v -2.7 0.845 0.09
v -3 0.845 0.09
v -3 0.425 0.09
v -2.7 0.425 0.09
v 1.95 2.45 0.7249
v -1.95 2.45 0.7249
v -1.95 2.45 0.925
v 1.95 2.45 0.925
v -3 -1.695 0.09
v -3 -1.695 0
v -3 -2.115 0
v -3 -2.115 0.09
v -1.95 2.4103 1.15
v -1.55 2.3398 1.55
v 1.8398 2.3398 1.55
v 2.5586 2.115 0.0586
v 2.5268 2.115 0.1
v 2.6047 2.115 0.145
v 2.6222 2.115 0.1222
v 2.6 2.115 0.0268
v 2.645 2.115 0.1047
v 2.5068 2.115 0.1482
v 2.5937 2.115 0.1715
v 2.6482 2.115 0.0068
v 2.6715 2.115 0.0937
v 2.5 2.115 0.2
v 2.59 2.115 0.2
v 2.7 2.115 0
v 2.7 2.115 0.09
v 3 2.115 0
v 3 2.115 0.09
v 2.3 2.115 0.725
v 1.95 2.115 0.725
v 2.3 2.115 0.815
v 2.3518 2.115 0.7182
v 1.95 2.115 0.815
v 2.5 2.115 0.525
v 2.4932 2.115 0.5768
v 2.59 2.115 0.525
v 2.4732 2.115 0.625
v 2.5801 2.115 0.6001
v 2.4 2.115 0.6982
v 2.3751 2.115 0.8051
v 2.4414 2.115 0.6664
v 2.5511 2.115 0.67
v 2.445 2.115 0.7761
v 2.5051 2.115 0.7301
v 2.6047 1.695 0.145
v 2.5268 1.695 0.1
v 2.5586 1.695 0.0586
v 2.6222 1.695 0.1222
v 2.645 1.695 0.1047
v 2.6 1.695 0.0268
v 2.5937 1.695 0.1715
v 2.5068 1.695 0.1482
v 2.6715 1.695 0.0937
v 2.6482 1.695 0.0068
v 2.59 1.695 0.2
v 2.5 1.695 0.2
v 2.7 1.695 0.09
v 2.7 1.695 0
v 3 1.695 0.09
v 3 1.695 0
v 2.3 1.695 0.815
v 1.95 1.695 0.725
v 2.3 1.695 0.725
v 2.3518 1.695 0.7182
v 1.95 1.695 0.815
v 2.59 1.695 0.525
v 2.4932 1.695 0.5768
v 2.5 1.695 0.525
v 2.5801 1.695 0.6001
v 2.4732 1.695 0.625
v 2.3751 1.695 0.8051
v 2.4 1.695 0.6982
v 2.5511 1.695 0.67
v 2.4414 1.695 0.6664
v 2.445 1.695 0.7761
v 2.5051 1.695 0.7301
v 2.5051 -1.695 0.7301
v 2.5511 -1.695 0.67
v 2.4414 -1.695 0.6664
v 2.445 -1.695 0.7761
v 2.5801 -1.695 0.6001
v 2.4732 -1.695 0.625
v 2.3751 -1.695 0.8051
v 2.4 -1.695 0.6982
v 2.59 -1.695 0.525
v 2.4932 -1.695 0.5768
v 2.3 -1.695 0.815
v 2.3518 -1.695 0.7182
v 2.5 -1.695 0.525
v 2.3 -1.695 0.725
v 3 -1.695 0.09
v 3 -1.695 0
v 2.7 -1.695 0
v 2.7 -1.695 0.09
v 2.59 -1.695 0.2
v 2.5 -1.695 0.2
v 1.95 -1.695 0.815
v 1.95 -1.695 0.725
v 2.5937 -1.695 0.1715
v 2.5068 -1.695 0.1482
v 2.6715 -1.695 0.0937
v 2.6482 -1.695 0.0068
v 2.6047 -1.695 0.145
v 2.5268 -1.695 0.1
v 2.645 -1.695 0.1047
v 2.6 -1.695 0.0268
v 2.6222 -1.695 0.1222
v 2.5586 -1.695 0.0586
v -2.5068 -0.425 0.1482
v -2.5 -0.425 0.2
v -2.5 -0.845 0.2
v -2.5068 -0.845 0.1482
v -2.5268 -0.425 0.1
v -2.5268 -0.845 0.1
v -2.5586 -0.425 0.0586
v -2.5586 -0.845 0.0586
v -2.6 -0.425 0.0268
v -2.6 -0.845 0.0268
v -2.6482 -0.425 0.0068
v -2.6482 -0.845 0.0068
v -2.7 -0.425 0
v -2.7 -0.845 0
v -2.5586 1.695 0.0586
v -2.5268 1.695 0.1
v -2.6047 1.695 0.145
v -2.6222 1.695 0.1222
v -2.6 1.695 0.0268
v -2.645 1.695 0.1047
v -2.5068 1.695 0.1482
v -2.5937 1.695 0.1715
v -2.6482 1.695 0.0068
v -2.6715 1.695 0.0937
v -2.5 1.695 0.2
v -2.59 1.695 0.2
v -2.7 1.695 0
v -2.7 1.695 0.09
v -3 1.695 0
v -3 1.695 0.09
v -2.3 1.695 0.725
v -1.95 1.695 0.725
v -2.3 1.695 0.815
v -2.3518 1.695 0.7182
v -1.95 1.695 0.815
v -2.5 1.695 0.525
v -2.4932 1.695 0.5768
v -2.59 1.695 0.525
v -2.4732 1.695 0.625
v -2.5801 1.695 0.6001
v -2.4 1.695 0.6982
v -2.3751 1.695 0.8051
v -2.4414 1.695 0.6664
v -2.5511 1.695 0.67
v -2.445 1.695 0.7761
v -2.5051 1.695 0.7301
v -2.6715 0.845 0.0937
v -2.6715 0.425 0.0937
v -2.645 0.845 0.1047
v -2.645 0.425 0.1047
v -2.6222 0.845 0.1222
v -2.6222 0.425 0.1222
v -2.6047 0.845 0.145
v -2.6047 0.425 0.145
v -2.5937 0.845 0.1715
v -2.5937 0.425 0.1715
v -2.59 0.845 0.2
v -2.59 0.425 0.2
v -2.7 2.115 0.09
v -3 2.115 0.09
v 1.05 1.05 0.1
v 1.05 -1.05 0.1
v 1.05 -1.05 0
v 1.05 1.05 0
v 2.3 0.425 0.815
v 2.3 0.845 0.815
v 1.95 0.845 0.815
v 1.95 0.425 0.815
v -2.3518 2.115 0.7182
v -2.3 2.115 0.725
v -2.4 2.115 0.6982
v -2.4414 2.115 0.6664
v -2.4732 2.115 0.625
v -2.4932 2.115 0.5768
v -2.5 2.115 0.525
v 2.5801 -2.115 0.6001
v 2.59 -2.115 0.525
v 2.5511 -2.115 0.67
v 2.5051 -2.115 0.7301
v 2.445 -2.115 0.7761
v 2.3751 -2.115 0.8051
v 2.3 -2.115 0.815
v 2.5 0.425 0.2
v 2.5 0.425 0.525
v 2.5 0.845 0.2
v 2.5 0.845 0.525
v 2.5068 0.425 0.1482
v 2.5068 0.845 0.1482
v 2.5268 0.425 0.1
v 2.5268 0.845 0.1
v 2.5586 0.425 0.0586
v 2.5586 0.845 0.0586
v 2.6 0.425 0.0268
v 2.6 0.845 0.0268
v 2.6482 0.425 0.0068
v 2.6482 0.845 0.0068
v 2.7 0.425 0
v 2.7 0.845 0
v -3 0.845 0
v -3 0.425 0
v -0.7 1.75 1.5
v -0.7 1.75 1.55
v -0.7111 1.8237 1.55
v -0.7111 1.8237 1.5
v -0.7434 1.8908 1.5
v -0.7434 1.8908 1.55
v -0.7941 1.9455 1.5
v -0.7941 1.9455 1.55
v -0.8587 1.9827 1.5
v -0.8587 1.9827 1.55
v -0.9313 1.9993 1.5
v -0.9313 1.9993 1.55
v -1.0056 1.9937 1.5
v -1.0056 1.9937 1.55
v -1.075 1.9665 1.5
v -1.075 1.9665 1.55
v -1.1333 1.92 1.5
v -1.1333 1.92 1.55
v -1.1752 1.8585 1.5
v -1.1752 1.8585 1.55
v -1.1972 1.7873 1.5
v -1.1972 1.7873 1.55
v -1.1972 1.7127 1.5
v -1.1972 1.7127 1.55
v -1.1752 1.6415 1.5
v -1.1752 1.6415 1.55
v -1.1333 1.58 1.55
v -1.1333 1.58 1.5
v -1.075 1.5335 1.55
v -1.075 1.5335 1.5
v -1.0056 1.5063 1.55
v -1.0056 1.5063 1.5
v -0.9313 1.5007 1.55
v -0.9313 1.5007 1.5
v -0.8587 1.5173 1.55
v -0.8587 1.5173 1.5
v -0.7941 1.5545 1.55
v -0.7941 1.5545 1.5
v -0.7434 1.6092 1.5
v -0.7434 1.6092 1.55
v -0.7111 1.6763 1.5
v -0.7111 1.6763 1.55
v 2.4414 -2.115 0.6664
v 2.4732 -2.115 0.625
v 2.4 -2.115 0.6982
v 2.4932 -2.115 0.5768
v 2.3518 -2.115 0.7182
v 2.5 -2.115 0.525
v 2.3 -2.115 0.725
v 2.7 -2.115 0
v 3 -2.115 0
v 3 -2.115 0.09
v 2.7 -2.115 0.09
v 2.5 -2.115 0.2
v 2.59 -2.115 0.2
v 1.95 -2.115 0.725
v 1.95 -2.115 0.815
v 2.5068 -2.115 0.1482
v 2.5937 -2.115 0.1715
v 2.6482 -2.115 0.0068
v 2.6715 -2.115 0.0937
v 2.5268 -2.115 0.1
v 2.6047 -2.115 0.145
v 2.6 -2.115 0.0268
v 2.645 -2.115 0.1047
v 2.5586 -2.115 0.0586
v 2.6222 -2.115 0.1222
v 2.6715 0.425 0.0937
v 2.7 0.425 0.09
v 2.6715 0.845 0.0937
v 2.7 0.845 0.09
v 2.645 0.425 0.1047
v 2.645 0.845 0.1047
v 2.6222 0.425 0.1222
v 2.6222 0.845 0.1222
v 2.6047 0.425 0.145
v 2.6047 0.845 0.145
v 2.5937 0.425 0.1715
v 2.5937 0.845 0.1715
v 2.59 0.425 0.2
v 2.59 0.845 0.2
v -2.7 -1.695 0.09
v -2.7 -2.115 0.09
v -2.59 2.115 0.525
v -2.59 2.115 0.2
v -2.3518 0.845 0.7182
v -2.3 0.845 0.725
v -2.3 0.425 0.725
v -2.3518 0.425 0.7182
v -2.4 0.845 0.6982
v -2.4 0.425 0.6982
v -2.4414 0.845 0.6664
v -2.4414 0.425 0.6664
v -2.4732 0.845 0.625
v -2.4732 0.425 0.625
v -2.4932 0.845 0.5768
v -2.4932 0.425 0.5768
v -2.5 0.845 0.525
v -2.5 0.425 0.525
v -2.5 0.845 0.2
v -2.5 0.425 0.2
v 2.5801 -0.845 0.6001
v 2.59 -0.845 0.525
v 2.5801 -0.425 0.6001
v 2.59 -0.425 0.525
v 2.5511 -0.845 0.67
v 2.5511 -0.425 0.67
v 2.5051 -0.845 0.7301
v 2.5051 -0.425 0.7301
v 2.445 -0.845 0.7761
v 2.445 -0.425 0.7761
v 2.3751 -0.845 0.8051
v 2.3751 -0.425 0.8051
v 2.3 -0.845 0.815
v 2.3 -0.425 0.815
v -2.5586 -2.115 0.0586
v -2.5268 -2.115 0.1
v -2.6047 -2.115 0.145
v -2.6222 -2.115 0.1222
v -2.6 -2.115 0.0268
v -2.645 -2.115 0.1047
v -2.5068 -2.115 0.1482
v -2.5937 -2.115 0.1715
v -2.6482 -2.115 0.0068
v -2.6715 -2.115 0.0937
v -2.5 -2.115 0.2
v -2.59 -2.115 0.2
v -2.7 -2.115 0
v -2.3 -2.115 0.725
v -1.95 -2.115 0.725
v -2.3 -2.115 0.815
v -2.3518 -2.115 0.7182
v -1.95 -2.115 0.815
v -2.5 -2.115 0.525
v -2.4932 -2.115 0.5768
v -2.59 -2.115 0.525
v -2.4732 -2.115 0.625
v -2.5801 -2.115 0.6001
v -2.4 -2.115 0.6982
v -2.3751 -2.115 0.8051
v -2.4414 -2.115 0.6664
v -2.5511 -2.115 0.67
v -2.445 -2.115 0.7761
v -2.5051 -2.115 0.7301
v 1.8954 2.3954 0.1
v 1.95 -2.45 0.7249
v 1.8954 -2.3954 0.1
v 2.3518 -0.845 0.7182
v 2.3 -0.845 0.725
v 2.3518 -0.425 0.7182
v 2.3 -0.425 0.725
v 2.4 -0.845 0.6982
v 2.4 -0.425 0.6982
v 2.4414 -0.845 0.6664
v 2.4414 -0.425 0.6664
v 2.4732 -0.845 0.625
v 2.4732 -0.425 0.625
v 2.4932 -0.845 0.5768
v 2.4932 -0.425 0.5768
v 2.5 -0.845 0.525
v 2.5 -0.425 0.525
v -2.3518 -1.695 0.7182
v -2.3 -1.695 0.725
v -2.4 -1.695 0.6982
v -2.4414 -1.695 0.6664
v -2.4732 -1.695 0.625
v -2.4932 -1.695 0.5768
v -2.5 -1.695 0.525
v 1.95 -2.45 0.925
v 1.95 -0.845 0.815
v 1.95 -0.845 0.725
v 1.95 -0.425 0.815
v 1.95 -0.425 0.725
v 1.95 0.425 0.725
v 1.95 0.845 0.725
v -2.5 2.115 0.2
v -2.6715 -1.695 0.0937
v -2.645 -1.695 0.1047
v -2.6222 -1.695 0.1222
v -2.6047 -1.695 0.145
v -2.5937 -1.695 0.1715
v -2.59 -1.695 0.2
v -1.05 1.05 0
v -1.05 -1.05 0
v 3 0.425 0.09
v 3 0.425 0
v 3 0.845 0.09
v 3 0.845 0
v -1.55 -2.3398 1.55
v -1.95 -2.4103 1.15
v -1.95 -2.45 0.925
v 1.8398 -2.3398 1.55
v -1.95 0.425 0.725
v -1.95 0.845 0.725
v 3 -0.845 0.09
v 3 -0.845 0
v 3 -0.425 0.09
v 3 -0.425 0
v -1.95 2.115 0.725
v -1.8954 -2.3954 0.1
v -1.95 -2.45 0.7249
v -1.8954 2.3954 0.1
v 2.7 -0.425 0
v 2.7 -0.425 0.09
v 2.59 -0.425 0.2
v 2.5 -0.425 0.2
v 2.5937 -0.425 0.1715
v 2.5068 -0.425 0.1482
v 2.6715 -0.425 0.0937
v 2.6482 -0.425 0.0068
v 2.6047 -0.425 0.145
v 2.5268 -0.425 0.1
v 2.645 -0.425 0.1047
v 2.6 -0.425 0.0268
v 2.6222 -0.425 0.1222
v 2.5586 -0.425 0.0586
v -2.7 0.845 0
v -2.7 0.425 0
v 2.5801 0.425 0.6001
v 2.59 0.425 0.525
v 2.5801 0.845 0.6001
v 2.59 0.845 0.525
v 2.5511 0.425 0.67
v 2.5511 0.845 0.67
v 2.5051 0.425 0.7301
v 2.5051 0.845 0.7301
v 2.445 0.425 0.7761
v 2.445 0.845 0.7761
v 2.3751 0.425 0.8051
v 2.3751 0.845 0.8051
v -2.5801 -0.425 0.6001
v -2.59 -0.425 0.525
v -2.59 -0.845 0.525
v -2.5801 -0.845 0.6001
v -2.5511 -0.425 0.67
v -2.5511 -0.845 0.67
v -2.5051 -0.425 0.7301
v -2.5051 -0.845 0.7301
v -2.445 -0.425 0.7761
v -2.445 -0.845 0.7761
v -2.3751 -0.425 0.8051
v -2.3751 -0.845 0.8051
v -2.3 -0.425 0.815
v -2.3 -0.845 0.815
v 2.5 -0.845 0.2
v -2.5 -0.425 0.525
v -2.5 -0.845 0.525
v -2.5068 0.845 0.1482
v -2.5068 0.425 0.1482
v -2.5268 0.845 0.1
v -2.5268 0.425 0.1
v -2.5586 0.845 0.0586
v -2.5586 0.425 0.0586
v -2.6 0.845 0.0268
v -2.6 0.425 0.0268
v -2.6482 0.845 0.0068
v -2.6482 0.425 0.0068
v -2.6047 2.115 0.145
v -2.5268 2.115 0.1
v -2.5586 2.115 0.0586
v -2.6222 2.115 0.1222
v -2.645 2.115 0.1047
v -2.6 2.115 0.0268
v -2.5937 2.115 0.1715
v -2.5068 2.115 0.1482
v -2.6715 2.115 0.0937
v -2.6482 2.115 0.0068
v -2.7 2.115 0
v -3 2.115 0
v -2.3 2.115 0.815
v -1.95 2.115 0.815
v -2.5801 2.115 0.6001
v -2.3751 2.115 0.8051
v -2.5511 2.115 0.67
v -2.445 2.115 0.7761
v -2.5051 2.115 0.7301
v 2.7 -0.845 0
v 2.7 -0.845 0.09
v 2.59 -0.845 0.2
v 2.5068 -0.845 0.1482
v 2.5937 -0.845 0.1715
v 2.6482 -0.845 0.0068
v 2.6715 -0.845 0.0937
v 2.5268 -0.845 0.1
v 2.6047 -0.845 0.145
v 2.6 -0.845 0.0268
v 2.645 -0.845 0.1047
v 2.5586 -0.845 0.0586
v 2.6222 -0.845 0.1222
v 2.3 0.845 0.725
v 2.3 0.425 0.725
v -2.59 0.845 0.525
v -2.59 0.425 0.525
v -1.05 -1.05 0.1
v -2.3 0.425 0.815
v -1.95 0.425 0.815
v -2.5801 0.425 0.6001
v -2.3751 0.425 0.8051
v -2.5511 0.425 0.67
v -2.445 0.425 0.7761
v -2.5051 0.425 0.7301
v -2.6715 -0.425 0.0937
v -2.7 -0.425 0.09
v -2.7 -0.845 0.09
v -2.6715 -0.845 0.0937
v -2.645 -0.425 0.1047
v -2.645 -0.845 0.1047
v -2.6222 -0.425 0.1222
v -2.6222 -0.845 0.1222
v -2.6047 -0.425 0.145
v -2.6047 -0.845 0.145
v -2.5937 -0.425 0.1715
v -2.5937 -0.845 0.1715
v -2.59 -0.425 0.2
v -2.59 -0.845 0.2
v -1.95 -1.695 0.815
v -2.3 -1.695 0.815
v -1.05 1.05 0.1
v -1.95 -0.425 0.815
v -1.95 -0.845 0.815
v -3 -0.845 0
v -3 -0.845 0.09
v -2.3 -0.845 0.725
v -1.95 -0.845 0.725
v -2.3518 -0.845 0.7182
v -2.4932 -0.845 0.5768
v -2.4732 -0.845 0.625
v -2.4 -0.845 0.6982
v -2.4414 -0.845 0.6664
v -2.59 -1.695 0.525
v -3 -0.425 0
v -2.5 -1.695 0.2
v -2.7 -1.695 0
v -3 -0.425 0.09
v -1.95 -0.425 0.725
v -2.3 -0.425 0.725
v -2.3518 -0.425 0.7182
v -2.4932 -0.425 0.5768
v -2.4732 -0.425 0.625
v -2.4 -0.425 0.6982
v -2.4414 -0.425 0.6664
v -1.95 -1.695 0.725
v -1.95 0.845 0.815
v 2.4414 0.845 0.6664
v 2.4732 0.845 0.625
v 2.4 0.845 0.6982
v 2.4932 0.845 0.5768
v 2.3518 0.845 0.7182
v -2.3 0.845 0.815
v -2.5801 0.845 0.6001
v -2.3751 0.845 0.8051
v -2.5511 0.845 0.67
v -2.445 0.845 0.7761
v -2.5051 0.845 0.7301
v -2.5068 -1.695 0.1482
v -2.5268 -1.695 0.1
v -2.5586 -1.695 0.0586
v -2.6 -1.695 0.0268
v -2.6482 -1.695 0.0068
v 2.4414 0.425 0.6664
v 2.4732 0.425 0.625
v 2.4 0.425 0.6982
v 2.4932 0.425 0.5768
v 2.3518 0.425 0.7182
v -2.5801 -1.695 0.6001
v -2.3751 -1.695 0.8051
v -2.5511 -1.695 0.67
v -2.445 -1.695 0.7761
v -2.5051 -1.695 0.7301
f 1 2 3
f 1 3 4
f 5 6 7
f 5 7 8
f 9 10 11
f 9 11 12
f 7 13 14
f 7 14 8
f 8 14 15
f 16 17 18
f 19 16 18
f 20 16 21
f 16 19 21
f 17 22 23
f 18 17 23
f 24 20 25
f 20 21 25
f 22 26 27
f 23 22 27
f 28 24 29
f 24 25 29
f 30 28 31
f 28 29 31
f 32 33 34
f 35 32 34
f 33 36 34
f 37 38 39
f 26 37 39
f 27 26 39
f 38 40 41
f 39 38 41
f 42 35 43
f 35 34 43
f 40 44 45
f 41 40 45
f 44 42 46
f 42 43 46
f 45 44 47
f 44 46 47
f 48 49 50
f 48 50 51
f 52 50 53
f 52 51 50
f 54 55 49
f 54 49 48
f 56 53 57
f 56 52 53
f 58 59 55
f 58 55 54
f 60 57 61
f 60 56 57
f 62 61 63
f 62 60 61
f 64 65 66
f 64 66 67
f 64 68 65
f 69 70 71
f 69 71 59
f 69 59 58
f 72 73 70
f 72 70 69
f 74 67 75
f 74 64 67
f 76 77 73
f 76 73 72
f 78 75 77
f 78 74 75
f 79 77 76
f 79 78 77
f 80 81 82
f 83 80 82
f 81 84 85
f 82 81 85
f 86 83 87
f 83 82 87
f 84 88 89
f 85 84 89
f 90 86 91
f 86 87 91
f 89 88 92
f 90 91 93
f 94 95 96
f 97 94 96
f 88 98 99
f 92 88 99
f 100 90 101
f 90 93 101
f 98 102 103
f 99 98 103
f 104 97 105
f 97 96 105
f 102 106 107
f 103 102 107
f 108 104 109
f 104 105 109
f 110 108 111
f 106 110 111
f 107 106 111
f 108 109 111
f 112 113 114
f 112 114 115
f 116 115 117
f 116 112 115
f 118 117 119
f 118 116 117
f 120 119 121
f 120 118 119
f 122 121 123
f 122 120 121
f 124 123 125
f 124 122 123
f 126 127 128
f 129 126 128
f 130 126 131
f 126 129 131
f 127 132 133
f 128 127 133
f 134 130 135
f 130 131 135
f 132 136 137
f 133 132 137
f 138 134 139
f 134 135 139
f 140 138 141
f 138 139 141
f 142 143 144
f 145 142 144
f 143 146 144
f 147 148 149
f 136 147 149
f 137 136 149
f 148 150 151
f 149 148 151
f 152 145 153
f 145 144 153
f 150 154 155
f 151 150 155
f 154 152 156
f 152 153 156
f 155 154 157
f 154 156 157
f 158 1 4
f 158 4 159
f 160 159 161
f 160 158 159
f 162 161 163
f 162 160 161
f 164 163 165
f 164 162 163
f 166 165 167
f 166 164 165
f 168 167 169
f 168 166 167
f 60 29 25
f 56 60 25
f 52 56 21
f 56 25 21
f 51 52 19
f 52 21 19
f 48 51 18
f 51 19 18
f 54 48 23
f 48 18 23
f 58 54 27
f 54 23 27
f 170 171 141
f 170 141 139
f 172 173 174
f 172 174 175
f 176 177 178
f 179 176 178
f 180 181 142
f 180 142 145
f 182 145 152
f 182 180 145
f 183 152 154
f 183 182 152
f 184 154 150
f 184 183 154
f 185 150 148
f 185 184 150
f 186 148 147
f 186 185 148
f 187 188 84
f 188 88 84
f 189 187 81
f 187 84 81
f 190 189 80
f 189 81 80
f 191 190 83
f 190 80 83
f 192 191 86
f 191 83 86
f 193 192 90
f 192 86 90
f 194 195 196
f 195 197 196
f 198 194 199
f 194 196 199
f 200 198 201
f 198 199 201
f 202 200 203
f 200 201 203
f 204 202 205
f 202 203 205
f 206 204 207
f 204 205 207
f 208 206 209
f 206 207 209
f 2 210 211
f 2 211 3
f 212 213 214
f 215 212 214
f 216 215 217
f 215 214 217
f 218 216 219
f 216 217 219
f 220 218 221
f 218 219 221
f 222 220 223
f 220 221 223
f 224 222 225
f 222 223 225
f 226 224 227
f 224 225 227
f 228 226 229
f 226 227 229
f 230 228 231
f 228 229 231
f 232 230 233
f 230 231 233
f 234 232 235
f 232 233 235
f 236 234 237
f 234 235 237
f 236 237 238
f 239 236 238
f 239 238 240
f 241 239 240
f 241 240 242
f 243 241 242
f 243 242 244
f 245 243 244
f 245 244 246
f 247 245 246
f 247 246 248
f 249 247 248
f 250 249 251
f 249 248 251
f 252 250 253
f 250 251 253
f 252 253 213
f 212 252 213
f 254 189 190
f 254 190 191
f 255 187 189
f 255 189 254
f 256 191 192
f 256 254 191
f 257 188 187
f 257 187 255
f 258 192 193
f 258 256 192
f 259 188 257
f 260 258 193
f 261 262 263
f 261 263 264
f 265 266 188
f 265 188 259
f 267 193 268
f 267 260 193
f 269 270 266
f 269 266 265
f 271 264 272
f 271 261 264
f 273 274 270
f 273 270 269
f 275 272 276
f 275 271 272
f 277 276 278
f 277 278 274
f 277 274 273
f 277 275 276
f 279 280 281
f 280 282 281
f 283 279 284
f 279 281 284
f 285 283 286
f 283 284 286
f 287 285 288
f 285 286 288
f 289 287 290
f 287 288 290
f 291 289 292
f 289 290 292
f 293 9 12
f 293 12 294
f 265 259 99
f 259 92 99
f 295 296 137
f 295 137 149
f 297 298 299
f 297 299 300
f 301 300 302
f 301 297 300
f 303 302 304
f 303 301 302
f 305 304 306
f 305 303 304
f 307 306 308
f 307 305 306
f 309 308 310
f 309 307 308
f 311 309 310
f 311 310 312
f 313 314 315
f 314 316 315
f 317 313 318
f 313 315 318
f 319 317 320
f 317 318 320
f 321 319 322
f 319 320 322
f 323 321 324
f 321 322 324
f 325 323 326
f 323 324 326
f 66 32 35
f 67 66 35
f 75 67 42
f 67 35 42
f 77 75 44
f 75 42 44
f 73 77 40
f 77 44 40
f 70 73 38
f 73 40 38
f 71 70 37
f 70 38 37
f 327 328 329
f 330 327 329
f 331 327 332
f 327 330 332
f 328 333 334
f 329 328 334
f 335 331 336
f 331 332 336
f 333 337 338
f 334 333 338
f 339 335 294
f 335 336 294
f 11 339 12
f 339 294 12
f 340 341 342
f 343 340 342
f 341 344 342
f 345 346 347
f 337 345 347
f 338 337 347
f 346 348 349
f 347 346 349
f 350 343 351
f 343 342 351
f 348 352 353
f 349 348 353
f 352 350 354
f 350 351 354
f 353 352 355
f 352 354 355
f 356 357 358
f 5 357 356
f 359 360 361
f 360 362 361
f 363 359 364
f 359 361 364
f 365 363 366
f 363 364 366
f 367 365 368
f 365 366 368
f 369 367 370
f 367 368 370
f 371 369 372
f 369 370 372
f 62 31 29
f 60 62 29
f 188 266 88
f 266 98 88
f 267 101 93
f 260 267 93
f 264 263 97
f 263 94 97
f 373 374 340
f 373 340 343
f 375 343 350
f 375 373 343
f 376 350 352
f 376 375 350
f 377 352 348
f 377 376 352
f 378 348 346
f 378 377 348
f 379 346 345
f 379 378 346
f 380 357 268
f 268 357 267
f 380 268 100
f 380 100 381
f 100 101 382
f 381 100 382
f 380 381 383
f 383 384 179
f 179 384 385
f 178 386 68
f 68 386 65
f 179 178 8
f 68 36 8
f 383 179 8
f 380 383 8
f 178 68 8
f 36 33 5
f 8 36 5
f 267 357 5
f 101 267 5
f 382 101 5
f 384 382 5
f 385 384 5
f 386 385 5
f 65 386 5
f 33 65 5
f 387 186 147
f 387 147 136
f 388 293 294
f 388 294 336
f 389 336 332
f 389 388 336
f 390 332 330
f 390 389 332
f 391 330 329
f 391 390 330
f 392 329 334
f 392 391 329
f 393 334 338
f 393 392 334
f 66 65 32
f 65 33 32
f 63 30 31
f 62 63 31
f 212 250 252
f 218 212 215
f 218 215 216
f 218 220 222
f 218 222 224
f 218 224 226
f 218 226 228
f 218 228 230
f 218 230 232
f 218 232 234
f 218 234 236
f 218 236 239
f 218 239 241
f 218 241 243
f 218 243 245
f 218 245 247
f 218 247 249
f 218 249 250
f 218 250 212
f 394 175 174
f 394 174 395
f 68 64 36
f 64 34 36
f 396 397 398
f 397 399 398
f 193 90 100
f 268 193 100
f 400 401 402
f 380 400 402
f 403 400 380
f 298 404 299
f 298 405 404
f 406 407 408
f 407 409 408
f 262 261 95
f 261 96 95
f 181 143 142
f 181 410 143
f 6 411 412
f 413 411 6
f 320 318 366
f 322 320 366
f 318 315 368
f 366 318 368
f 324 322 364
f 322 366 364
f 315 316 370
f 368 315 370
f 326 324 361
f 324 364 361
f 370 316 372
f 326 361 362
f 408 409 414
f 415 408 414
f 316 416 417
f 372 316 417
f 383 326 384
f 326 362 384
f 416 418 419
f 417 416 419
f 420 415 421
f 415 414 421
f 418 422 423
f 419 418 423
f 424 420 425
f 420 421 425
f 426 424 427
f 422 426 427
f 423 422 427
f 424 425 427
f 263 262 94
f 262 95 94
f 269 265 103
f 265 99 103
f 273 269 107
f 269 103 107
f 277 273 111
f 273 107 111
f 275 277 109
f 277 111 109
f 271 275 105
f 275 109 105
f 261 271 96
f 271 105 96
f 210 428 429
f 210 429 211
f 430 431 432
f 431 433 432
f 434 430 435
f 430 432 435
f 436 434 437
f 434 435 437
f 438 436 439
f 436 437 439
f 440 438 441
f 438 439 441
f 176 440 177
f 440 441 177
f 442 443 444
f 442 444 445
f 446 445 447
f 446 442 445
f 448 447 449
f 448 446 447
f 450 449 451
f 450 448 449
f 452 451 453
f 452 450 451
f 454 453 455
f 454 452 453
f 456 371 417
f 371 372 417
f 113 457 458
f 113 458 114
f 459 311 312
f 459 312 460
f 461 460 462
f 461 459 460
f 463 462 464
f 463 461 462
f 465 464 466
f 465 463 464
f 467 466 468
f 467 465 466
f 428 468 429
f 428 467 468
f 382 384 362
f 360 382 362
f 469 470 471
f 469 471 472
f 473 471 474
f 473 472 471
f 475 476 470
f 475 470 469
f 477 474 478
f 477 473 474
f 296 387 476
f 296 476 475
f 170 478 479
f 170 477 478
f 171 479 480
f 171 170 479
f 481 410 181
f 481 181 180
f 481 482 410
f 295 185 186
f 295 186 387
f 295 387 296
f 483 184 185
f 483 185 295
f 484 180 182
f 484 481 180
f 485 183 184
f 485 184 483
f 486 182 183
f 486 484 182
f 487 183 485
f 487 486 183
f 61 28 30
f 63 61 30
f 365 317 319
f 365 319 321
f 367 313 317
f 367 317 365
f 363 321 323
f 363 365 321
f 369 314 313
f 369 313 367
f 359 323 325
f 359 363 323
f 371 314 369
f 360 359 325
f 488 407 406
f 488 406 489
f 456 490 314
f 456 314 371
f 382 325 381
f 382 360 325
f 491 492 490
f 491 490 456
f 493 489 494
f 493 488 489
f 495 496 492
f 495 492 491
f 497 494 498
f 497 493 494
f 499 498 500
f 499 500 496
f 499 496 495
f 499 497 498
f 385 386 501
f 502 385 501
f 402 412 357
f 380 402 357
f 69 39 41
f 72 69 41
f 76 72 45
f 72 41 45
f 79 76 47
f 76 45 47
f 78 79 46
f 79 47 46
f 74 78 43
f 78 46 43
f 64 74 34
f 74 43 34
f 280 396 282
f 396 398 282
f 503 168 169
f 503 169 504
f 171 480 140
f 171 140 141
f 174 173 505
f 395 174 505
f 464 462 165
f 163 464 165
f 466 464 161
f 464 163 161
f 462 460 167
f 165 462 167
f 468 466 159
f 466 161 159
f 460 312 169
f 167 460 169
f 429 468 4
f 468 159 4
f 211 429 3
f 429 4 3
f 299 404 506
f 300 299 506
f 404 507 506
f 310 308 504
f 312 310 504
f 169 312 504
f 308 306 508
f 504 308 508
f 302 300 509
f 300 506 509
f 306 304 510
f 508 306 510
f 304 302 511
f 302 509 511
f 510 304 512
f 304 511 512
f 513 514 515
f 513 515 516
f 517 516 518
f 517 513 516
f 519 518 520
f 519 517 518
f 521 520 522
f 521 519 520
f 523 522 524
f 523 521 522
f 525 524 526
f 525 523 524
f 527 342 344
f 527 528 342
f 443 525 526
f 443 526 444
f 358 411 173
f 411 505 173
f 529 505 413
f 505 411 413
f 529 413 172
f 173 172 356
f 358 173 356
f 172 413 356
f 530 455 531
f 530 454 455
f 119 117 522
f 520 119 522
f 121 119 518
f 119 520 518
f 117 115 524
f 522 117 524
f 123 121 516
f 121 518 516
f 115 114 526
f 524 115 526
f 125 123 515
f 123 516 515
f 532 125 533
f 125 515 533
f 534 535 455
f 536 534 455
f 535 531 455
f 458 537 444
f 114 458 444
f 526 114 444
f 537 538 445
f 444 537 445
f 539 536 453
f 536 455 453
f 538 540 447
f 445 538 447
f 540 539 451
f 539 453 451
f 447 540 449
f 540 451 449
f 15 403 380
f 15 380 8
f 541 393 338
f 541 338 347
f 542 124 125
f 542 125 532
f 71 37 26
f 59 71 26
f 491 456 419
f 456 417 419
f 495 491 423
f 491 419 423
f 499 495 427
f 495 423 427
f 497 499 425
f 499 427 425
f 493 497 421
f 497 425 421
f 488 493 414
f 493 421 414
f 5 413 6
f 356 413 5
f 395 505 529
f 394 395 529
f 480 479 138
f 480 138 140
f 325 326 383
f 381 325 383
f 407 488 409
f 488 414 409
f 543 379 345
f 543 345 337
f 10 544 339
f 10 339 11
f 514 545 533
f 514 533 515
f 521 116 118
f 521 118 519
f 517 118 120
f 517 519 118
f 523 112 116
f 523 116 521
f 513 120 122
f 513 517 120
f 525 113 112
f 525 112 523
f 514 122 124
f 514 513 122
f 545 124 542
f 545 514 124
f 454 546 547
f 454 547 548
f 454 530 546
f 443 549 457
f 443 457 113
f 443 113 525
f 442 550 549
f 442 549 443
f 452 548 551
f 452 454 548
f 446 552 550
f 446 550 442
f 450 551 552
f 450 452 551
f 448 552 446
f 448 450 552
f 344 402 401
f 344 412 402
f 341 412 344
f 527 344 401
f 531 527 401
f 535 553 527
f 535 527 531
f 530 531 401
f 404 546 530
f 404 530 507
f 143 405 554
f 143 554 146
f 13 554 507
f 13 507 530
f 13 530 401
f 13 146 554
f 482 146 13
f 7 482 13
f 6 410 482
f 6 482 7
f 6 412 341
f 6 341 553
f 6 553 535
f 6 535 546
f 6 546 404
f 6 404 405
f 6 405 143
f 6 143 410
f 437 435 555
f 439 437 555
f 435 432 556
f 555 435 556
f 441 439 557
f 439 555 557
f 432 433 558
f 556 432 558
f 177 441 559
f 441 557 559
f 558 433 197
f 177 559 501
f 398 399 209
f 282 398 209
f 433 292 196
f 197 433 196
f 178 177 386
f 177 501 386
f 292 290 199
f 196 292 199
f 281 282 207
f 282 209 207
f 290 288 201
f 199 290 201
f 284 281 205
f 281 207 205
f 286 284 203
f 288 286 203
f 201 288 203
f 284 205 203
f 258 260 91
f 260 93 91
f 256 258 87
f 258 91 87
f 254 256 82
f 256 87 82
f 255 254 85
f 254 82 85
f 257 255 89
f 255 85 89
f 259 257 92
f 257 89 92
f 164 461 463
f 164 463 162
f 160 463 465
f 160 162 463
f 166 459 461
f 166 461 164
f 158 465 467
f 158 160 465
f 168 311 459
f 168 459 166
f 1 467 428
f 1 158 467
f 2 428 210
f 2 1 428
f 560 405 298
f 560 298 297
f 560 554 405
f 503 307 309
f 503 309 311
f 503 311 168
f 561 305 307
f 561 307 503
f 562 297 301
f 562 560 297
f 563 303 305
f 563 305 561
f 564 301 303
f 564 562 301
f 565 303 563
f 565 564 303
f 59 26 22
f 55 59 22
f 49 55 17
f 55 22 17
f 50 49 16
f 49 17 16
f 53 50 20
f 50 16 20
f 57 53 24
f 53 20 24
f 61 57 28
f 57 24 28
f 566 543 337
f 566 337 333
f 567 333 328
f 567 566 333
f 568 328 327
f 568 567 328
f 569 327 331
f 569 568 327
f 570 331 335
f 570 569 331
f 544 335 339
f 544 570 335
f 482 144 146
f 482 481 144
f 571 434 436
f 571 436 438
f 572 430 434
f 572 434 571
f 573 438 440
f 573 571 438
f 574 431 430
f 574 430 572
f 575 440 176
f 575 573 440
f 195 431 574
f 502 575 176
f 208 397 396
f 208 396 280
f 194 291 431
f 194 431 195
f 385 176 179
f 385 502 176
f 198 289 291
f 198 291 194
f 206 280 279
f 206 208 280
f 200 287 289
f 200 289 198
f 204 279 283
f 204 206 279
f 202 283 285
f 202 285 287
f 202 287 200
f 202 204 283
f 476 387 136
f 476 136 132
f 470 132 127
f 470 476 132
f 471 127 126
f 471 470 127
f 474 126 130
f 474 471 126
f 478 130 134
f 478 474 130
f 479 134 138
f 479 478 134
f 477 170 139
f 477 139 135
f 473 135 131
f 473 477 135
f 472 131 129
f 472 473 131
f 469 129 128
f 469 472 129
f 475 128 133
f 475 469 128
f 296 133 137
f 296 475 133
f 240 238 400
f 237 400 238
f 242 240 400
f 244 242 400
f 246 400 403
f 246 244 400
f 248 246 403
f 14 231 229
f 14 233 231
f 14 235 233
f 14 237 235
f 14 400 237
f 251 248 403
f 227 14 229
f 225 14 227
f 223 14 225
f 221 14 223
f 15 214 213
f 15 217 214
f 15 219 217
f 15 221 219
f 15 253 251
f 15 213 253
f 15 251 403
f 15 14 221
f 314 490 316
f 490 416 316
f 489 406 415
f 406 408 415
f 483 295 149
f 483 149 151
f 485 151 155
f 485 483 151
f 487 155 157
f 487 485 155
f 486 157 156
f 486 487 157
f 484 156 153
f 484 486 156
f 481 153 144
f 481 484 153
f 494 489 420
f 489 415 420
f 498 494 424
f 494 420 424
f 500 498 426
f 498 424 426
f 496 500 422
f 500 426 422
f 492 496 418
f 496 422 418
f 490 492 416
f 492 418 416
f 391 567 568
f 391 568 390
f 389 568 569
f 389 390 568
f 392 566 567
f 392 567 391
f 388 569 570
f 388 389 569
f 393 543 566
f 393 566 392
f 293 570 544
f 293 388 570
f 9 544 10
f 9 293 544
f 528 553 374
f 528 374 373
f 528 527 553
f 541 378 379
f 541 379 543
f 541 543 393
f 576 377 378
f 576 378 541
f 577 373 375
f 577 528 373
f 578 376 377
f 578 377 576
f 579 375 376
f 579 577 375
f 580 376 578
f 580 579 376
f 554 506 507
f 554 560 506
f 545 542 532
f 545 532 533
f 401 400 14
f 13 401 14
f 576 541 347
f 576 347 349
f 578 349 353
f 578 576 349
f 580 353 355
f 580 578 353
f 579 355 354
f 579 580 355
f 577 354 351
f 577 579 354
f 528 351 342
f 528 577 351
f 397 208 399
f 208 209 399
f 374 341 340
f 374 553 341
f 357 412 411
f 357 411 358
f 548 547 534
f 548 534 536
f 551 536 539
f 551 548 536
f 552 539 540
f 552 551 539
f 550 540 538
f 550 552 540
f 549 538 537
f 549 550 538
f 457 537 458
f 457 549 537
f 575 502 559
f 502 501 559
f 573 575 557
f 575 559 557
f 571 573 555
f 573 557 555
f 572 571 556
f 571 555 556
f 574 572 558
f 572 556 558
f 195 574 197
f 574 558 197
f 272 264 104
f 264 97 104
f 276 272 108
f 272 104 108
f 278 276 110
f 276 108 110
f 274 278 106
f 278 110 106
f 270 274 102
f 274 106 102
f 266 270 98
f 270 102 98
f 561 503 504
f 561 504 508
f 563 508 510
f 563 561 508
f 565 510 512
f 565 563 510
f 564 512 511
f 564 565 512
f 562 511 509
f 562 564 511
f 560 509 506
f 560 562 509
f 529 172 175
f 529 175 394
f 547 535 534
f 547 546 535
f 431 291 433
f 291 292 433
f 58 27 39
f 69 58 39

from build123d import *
from OCP.BRepFilletAPI import BRepFilletAPI_MakeChamfer

# Parameters (mm, degrees)
ESQUISSE2_W              = 3.9
ESQUISSE2_H              = 4.9
CORP_DEPTH               = 1.45
PIN_1_DEPTH              = 0.21
R_P_TITION_PIN_1_4_COUNT = 4
R_P_TITION_PIN_1_4_PITCH = 1.27
SYM_TRIE1_COPY_1_DEPTH   = 0.21
SYM_TRIE1_COPY_2_DEPTH   = 0.21
SYM_TRIE1_COPY_3_DEPTH   = 0.21
CHANFREIN4_SIZE          = 0.625
CHANFREIN4_SIZE2         = 0.110204363
CHANFREIN5_SIZE          = 0.625
CHANFREIN5_SIZE_2        = 0.054680415
ESQUISSE8_R              = 0.25
ENL_V_MAT_EXTRU_1_DEPTH  = 0.05
CHANFREIN7_SIZE          = 0.4
ESQUISSE9_W              = 2.1
ESQUISSE9_H              = 2.1
EXPOSED_PAD_DEPTH        = 0.1


with BuildPart() as part:
    # Esquisse2 → corp (new body)
    with BuildSketch(Plane.XY.offset(0.1)):
        Rectangle(ESQUISSE2_W, ESQUISSE2_H)
    extrude(amount=CORP_DEPTH)

    # Esquisse6 → pin 1 (add, symmetric)
    with BuildSketch(Plane(origin=(0, 1.905, 0), x_dir=(-1, 0, 0), z_dir=(0, 1, 0))):
        with BuildLine():
            Line((1.95, 0.725), (2.3, 0.725))
            ThreePointArc((2.3, 0.725), (2.441421356, 0.666421356), (2.5, 0.525))
            Line((2.5, 0.525), (2.5, 0.2))
            ThreePointArc((2.5, 0.2), (2.558578644, 0.058578644), (2.7, 0))
            Line((2.7, 0), (3, 0))
            Line((3, 0), (3, 0.09))
            Line((3, 0.09), (2.7, 0.09))
            ThreePointArc((2.7, 0.09), (2.622218254, 0.122218254), (2.59, 0.2))
            Line((2.59, 0.2), (2.59, 0.525))
            ThreePointArc((2.59, 0.525), (2.505060967, 0.730060967), (2.3, 0.815))
            Line((2.3, 0.815), (1.95, 0.815))
            Line((1.95, 0.815), (1.95, 0.725))
        make_face()
    pin_1 = extrude(amount=PIN_1_DEPTH, both=True)

    # Répétition pin 1-4: pin 1 ×4
    with Locations(*[(0, -i * R_P_TITION_PIN_1_4_PITCH, 0) for i in range(1, R_P_TITION_PIN_1_4_COUNT)]):
        add(pin_1)

    # Symétrie1: pin 1 across plane
    add(pin_1.mirror(Plane(origin=(0, 0, 0), x_dir=(0, 0, 1), z_dir=(1, 0, 0))))

    # Symétrie1 copy 1 sketch → Symétrie1 copy 1 (add, symmetric)
    with BuildSketch(Plane(origin=(0, 0.635, 0), x_dir=(1, 0, 0), z_dir=(0, 1, 0))):
        with BuildLine():
            Line((1.95, -0.725), (2.3, -0.725))
            ThreePointArc((2.3, -0.725), (2.441421356, -0.666421356), (2.5, -0.525))
            Line((2.5, -0.525), (2.5, -0.2))
            ThreePointArc((2.5, -0.2), (2.558578644, -0.058578644), (2.7, 0))
            Line((2.7, 0), (3, 0))
            Line((3, 0), (3, -0.09))
            Line((3, -0.09), (2.7, -0.09))
            ThreePointArc((2.7, -0.09), (2.622218254, -0.122218254), (2.59, -0.2))
            Line((2.59, -0.2), (2.59, -0.525))
            ThreePointArc((2.59, -0.525), (2.505060967, -0.730060967), (2.3, -0.815))
            Line((2.3, -0.815), (1.95, -0.815))
            Line((1.95, -0.815), (1.95, -0.725))
        make_face()
    extrude(amount=SYM_TRIE1_COPY_1_DEPTH, both=True)

    # Symétrie1 copy 2 sketch → Symétrie1 copy 2 (add, symmetric)
    with BuildSketch(Plane(origin=(0, -0.635, 0), x_dir=(1, 0, 0), z_dir=(0, 1, 0))):
        with BuildLine():
            Line((1.95, -0.725), (2.3, -0.725))
            ThreePointArc((2.3, -0.725), (2.441421356, -0.666421356), (2.5, -0.525))
            Line((2.5, -0.525), (2.5, -0.2))
            ThreePointArc((2.5, -0.2), (2.558578644, -0.058578644), (2.7, 0))
            Line((2.7, 0), (3, 0))
            Line((3, 0), (3, -0.09))
            Line((3, -0.09), (2.7, -0.09))
            ThreePointArc((2.7, -0.09), (2.622218254, -0.122218254), (2.59, -0.2))
            Line((2.59, -0.2), (2.59, -0.525))
            ThreePointArc((2.59, -0.525), (2.505060967, -0.730060967), (2.3, -0.815))
            Line((2.3, -0.815), (1.95, -0.815))
            Line((1.95, -0.815), (1.95, -0.725))
        make_face()
    extrude(amount=SYM_TRIE1_COPY_2_DEPTH, both=True)

    # Symétrie1 copy 3 sketch → Symétrie1 copy 3 (add, symmetric)
    with BuildSketch(Plane(origin=(0, -1.905, 0), x_dir=(1, 0, 0), z_dir=(0, 1, 0))):
        with BuildLine():
            Line((1.95, -0.725), (2.3, -0.725))
            ThreePointArc((2.3, -0.725), (2.441421356, -0.666421356), (2.5, -0.525))
            Line((2.5, -0.525), (2.5, -0.2))
            ThreePointArc((2.5, -0.2), (2.558578644, -0.058578644), (2.7, 0))
            Line((2.7, 0), (3, 0))
            Line((3, 0), (3, -0.09))
            Line((3, -0.09), (2.7, -0.09))
            ThreePointArc((2.7, -0.09), (2.622218254, -0.122218254), (2.59, -0.2))
            Line((2.59, -0.2), (2.59, -0.525))
            ThreePointArc((2.59, -0.525), (2.505060967, -0.730060967), (2.3, -0.815))
            Line((2.3, -0.815), (1.95, -0.815))
            Line((1.95, -0.815), (1.95, -0.725))
        make_face()
    extrude(amount=SYM_TRIE1_COPY_3_DEPTH, both=True)

    # Chanfrein4: one chamfer whose edges measure the first distance from different faces: ONE call of the kernel's chamfer builder (chamfer() names one face for all edges)
    chanfrein4_edges_1 = [part.edges().sort_by_distance(p)[0] for p in [
        (1.95, 0, 1.55),
    ]]
    chanfrein4_side_1 = [part.faces().sort_by_distance(p)[0] for p in [
        (1.95, 0, 0.826195893),
    ]]
    chanfrein4_edges_2 = [part.edges().sort_by_distance(p)[0] for p in [
        (0, 2.45, 1.55),
    ]]
    chanfrein4_side_2 = [part.faces().sort_by_distance(p)[0] for p in [
        (0, 2.45, 0.825),
    ]]
    chanfrein4_edges_3 = [part.edges().sort_by_distance(p)[0] for p in [
        (0, -2.45, 1.55),
    ]]
    chanfrein4_side_3 = [part.faces().sort_by_distance(p)[0] for p in [
        (0, -2.45, 0.825),
    ]]
    chanfrein4 = BRepFilletAPI_MakeChamfer(part.part.solid().wrapped)
    for e in chanfrein4_edges_1:
        chanfrein4.Add(CHANFREIN4_SIZE, CHANFREIN4_SIZE2, e.wrapped, chanfrein4_side_1[0].wrapped)  # the first distance lies on this face
    for e in chanfrein4_edges_2:
        chanfrein4.Add(CHANFREIN4_SIZE, CHANFREIN4_SIZE2, e.wrapped, chanfrein4_side_2[0].wrapped)  # the first distance lies on this face
    for e in chanfrein4_edges_3:
        chanfrein4.Add(CHANFREIN4_SIZE, CHANFREIN4_SIZE2, e.wrapped, chanfrein4_side_3[0].wrapped)  # the first distance lies on this face
    add(Compound.cast(chanfrein4.Shape()), mode=Mode.REPLACE)

    # Chanfrein5
    chanfrein5_edges_1 = [part.edges().sort_by_distance(p)[0] for p in [
        (0, 2.45, 0.1),
    ]]
    chanfrein5_side_1 = [part.faces().sort_by_distance(p)[0] for p in [
        (0, 2.45, 0.101093608),
    ]]
    chanfrein5_edges_2 = [part.edges().sort_by_distance(p)[0] for p in [
        (1.95, 0, 0.1),
    ]]
    chanfrein5_side_2 = [part.faces().sort_by_distance(p)[0] for p in [
        (1.948906392, 0, 0.1),
    ]]
    chanfrein5_edges_3 = [part.edges().sort_by_distance(p)[0] for p in [
        (0, -2.45, 0.1),
    ]]
    chanfrein5_side_3 = [part.faces().sort_by_distance(p)[0] for p in [
        (0, -2.448906392, 0.1),
    ]]
    chanfrein5_edges_4 = [part.edges().sort_by_distance(p)[0] for p in [
        (-1.95, 0, 0.1),
    ]]
    chanfrein5_side_4 = [part.faces().sort_by_distance(p)[0] for p in [
        (-1.95, 0, 0.101093608),
    ]]
    chanfrein5 = BRepFilletAPI_MakeChamfer(part.part.solid().wrapped)
    for e in chanfrein5_edges_1:
        chanfrein5.Add(CHANFREIN5_SIZE - 0.0001, CHANFREIN5_SIZE_2 - 0.0001, e.wrapped, chanfrein5_side_1[0].wrapped)
    for e in chanfrein5_edges_2:
        chanfrein5.Add(CHANFREIN5_SIZE_2 - 0.0001, CHANFREIN5_SIZE - 0.0001, e.wrapped, chanfrein5_side_2[0].wrapped)
    for e in chanfrein5_edges_3:
        chanfrein5.Add(CHANFREIN5_SIZE_2 - 0.0001, CHANFREIN5_SIZE - 0.0001, e.wrapped, chanfrein5_side_3[0].wrapped)
    for e in chanfrein5_edges_4:
        chanfrein5.Add(CHANFREIN5_SIZE - 0.0001, CHANFREIN5_SIZE_2 - 0.0001, e.wrapped, chanfrein5_side_4[0].wrapped)
    add(Compound.cast(chanfrein5.Shape()), mode=Mode.REPLACE)  # a hair under: the kernel refuses the full size

    # Esquisse8 → Enlèv. mat.-Extru.1 (cut)
    with BuildSketch(Plane.XY.offset(1.55)):
        with Locations((-0.95, 1.75)):
            Circle(ESQUISSE8_R)
    extrude(amount=-ENL_V_MAT_EXTRU_1_DEPTH, mode=Mode.SUBTRACT)

    # Chanfrein7
    chanfrein7_edges = [part.edges().sort_by_distance(p)[0] for p in [
        (-1.95, 0, 1.55),
    ]]
    chamfer(chanfrein7_edges, length=CHANFREIN7_SIZE)

    # Esquisse9 → exposed pad (add)
    with BuildSketch(Plane(origin=(0, 0, 0.1), x_dir=(-1, 0, 0), z_dir=(0, 0, -1))):
        Rectangle(ESQUISSE9_W, ESQUISSE9_H)
    extrude(amount=EXPOSED_PAD_DEPTH)


solid = part.part
